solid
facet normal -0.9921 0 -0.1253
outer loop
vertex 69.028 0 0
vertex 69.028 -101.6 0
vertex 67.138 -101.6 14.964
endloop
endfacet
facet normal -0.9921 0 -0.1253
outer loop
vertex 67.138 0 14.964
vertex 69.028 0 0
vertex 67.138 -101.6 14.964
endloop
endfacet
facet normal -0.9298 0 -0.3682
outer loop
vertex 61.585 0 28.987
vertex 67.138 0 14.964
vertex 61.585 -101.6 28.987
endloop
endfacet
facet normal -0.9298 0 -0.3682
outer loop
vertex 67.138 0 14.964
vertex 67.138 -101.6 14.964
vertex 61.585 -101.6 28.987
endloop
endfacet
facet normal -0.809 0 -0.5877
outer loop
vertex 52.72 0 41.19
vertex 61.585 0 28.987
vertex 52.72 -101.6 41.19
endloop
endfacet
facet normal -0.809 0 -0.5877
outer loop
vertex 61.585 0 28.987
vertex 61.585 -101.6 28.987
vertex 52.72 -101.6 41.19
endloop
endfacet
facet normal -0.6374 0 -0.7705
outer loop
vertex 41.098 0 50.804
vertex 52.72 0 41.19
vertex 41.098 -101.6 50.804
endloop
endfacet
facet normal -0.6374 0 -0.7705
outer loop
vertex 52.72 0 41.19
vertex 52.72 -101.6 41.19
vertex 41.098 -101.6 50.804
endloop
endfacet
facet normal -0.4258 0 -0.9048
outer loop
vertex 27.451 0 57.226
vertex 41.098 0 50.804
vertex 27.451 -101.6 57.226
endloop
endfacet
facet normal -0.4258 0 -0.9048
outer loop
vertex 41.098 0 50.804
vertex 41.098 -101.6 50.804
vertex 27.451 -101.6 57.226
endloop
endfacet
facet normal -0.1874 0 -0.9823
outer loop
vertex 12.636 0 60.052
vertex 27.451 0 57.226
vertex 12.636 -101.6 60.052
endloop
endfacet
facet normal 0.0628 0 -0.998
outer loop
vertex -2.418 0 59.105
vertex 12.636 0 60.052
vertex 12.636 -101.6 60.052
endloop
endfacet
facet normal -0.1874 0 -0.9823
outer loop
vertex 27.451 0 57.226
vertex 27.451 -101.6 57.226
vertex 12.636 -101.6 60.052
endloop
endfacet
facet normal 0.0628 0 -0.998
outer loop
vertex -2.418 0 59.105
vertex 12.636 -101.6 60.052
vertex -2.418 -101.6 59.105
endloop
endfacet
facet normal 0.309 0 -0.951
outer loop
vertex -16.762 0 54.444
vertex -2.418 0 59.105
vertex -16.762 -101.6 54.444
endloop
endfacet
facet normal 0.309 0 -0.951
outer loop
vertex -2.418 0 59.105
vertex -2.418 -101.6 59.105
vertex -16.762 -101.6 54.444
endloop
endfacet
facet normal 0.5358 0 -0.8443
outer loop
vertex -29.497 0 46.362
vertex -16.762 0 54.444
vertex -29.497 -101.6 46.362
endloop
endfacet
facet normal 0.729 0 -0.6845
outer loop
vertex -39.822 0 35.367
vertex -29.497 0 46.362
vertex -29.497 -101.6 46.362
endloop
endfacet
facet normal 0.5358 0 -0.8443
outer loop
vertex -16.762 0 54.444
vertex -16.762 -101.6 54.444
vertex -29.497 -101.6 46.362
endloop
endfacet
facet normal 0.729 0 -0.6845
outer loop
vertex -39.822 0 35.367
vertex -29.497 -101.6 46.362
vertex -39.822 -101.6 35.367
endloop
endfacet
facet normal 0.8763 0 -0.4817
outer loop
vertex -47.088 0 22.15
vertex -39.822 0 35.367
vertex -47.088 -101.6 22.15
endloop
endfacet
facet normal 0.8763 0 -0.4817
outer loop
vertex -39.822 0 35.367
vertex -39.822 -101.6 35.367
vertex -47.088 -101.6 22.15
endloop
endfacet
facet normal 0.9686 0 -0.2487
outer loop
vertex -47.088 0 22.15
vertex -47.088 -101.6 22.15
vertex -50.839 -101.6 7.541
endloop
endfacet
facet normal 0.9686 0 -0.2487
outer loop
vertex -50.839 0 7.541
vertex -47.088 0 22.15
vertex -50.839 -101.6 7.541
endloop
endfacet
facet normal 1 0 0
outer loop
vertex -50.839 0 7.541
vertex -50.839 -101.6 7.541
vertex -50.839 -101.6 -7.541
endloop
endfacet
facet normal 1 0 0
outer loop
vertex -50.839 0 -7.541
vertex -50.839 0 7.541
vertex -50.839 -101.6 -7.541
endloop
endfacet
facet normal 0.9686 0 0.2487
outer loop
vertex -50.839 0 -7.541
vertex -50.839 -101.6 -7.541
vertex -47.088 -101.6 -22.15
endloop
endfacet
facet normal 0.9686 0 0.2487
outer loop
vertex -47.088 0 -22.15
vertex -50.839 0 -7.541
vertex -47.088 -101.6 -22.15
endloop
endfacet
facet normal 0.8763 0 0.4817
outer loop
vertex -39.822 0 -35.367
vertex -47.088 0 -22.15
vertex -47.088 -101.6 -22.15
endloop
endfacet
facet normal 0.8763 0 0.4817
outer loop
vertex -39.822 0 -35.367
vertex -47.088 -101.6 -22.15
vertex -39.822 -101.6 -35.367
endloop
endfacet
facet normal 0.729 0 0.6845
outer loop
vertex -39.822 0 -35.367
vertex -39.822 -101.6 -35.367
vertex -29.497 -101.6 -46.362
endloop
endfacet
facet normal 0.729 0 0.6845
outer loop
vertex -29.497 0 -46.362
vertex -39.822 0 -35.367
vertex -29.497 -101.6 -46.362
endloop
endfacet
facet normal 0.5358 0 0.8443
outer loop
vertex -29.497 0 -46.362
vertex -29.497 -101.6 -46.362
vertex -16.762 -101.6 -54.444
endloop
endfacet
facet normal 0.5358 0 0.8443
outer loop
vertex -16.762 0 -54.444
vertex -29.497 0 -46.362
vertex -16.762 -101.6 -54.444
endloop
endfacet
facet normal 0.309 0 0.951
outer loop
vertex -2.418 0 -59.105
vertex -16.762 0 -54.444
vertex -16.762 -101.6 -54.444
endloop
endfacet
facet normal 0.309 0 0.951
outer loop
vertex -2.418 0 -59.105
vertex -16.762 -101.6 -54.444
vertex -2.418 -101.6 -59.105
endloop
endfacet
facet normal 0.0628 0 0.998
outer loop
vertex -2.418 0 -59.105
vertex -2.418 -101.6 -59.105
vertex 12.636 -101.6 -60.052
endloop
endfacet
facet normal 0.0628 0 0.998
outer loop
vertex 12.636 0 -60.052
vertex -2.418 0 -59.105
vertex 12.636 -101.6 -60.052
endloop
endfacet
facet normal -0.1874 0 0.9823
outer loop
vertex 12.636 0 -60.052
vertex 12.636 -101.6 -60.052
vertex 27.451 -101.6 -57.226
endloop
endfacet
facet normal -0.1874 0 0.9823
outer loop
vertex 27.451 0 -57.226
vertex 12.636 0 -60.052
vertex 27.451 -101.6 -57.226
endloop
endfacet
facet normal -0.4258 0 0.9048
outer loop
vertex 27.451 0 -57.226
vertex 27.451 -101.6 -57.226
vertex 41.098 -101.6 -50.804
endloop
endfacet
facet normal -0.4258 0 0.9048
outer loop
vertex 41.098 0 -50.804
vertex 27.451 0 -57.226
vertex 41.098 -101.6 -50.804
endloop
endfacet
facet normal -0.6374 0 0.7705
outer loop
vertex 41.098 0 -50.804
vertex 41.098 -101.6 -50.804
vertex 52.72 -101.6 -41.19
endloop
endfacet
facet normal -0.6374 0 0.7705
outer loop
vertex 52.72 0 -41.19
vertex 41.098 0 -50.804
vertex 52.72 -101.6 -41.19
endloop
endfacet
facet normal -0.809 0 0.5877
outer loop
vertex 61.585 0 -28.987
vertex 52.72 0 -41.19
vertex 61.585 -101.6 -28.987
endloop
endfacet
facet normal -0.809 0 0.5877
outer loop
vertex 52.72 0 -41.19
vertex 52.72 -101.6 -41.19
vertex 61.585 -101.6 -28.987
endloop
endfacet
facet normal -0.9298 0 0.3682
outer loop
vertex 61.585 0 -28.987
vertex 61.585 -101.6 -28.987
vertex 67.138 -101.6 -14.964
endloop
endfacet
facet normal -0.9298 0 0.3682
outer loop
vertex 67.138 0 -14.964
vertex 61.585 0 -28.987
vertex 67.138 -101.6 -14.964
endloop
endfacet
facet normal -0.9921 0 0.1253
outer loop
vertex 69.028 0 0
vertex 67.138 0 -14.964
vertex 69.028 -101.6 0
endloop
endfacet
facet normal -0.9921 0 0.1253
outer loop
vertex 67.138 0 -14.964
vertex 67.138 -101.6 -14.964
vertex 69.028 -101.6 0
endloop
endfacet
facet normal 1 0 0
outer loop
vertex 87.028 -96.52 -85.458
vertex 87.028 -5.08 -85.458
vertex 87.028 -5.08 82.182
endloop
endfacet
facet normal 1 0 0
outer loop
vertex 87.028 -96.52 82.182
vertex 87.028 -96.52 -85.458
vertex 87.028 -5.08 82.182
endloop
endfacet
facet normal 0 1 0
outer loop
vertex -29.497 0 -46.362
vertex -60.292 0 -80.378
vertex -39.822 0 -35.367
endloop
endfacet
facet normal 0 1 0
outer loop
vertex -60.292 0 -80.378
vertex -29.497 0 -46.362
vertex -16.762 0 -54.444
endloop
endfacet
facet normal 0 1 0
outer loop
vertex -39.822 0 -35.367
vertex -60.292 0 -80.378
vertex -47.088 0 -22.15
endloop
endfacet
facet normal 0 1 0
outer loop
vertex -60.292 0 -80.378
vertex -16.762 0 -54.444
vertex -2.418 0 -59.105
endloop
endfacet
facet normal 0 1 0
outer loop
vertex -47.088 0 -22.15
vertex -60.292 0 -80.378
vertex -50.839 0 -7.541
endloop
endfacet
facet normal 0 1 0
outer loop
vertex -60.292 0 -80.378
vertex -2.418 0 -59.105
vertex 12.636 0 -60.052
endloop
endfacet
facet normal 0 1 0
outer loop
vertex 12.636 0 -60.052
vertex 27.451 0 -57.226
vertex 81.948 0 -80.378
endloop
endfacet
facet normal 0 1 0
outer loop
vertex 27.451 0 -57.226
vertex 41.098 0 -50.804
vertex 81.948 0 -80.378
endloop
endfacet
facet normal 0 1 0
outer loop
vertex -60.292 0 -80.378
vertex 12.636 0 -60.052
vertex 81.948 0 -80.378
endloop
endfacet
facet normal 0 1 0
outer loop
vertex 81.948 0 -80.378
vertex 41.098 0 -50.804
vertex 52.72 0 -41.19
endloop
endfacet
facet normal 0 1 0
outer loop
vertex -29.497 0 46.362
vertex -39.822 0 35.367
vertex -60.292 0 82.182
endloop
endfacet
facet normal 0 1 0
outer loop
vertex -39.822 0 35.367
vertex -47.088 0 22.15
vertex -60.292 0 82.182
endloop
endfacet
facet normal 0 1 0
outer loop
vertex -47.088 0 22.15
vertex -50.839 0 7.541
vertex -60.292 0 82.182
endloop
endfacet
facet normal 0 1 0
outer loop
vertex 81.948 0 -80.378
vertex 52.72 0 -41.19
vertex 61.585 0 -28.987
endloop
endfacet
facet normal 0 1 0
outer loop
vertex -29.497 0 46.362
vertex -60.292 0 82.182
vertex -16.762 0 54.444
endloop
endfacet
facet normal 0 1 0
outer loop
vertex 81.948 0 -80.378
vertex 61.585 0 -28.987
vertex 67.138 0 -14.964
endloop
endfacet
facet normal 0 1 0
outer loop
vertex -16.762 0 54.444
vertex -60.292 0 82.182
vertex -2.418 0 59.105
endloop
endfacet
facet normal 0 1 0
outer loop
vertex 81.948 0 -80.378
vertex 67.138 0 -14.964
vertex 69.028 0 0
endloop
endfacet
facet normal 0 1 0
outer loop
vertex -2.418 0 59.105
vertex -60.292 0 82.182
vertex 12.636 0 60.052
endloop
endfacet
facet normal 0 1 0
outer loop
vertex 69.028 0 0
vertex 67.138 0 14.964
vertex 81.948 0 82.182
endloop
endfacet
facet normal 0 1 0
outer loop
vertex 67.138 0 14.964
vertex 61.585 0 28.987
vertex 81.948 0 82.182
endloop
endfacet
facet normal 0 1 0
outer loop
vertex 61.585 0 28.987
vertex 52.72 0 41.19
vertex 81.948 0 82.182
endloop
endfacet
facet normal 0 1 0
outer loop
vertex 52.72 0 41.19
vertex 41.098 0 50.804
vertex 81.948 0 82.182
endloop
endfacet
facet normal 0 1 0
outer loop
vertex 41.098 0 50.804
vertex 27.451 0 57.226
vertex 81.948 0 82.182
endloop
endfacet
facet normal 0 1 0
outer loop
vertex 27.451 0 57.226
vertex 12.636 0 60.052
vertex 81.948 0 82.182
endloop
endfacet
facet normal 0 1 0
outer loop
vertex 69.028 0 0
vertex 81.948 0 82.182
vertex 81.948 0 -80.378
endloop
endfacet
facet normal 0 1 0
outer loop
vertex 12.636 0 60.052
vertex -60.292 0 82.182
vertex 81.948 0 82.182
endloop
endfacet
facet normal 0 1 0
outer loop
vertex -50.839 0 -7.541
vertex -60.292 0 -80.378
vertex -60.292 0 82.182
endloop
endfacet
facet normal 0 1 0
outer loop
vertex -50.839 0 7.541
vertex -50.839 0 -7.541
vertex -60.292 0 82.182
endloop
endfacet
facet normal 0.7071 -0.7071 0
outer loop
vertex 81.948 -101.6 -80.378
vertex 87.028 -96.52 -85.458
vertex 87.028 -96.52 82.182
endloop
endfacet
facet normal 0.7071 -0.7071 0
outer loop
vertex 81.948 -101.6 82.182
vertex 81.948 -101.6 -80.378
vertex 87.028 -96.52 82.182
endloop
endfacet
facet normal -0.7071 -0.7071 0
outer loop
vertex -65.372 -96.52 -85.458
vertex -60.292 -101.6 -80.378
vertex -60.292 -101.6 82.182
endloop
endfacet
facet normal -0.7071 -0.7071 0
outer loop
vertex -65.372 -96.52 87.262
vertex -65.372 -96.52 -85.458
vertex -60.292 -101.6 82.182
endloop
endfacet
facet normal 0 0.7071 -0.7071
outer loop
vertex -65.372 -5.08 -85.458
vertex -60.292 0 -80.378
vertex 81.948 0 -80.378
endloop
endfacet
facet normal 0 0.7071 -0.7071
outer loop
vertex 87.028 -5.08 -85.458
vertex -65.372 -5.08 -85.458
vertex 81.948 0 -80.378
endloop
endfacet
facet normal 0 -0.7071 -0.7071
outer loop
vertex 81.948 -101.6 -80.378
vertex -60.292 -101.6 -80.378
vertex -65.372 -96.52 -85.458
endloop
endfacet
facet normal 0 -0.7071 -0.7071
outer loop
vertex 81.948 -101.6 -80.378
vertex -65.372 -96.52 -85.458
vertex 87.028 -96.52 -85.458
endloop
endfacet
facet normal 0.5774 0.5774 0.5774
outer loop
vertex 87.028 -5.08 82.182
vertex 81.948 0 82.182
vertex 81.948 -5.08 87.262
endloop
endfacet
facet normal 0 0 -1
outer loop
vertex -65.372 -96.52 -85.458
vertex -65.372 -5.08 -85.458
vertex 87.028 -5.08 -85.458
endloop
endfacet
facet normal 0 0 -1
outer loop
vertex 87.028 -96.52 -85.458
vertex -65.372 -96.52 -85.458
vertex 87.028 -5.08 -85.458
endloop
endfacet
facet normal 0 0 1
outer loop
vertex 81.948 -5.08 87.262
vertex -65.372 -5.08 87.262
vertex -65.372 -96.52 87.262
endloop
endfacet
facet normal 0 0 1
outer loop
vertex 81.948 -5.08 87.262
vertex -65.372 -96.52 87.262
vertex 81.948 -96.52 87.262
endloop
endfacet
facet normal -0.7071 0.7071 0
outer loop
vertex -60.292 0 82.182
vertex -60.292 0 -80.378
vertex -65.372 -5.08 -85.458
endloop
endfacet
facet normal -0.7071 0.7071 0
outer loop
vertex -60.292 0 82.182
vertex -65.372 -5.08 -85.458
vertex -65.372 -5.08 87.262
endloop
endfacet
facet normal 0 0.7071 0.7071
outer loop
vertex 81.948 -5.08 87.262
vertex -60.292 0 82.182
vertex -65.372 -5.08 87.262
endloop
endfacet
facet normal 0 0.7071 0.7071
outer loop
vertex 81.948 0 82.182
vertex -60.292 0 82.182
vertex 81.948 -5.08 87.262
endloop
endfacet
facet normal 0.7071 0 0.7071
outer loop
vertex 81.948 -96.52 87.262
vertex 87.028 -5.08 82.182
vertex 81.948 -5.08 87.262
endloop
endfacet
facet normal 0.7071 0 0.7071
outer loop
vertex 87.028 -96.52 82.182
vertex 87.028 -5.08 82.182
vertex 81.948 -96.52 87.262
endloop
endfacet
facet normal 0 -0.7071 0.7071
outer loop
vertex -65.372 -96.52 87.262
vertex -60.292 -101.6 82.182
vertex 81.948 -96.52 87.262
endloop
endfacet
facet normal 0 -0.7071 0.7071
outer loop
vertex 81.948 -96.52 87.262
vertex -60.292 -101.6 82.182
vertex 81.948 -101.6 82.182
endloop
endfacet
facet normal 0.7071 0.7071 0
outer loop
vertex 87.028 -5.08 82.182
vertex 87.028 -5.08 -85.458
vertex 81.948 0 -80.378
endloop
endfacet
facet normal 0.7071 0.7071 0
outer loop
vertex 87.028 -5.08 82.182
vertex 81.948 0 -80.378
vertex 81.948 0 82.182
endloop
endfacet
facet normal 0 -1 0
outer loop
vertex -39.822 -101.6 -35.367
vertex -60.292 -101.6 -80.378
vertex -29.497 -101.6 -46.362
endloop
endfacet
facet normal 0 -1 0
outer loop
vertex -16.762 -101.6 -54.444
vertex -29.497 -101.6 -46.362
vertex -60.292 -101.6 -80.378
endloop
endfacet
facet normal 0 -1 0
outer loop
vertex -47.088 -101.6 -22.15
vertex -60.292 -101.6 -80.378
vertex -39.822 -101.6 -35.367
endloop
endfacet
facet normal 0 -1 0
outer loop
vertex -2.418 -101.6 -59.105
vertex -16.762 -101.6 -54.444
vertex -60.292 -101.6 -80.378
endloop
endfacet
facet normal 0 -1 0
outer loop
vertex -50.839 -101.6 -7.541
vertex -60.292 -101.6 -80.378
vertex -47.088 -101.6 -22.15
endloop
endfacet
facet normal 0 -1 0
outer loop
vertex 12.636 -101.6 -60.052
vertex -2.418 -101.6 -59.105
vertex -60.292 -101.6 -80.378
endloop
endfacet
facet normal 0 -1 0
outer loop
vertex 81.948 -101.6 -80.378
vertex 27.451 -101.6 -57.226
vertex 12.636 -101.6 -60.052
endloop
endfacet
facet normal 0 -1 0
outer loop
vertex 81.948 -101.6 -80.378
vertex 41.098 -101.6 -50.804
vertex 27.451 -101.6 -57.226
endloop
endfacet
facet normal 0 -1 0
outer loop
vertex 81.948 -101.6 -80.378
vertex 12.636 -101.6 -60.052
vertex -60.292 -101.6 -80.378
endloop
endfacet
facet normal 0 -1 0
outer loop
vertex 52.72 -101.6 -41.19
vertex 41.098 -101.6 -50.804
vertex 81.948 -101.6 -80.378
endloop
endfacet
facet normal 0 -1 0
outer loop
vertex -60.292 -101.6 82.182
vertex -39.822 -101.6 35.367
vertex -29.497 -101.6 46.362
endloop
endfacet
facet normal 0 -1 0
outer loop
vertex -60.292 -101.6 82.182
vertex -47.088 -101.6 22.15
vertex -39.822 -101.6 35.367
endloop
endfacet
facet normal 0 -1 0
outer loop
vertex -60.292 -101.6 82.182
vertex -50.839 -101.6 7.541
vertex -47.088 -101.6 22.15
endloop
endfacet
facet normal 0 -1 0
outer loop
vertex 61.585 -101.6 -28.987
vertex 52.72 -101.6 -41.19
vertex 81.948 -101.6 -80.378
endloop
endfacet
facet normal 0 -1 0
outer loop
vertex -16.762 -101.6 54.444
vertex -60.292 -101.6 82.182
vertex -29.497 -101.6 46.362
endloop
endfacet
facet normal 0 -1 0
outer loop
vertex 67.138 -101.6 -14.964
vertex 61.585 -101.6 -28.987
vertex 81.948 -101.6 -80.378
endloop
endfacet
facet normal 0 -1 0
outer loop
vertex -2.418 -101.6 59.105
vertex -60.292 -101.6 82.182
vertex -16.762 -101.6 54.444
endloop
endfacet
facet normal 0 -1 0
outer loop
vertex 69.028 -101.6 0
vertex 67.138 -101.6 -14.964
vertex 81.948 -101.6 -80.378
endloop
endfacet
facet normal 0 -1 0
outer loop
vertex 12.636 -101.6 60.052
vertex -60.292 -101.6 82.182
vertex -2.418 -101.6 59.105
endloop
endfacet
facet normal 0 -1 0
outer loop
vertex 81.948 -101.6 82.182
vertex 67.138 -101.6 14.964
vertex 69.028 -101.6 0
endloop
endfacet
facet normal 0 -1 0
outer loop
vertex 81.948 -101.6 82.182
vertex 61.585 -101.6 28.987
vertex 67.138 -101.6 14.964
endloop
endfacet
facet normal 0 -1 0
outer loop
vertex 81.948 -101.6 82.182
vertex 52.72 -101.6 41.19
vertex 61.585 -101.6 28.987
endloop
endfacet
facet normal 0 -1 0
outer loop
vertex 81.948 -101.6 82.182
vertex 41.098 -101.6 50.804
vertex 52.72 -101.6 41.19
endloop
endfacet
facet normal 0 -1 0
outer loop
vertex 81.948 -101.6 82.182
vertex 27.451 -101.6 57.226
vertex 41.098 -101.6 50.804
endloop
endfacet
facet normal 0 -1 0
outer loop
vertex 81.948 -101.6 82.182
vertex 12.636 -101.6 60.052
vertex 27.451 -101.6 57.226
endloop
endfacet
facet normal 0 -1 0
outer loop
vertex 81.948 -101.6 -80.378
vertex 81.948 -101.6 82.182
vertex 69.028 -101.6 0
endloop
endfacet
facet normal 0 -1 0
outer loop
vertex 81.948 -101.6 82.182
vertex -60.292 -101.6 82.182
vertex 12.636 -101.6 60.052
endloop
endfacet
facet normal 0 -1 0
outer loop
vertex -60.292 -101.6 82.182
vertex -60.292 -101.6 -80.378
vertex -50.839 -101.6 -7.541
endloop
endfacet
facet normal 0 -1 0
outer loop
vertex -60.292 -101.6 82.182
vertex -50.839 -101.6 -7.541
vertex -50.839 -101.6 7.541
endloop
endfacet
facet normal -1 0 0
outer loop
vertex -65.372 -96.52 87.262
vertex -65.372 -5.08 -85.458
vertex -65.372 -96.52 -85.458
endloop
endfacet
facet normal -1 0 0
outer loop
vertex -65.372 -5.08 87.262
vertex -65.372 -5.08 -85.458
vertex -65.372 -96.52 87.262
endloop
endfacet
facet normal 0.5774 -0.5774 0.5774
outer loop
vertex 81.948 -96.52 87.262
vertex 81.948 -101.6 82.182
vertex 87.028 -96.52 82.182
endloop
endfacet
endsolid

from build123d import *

# Parameters (mm, degrees)
F0_W     = 152.4
F0_H     = 172.720005
F1_DEPTH = 101.6
F2_R     = 60.170779
F3_DEPTH = 101.601
F4_SIZE  = 5.08


with BuildPart() as f1:
    # F0 (on Front) → F1 (new body)
    with BuildSketch(Plane.XZ):
        with Locations((10.828421, 0.902369)):
            Rectangle(F0_W, F0_H)
    extrude(amount=F1_DEPTH)

    # F2 (on face) → F3 (cut, through all)
    with BuildSketch(Plane.XZ.offset(101.6)):
        with Locations((8.857357, 0)):
            Circle(F2_R)
    extrude(amount=-F3_DEPTH, mode=Mode.SUBTRACT)

    # F4
    f4_edges = [f1.edges().sort_by_distance(p)[0] for p in [
        (87.028421, -101.6, 0.90237),
        (10.828421, -101.6, 87.262372),
        (10.828421, -101.6, -85.457633),
        (-65.371579, -101.6, 0.90237),
        (10.828421, 0, -85.457633),
        (-65.371579, 0, 0.90237),
        (87.028421, 0, 0.90237),
        (10.828421, 0, 87.262372),
        (87.028421, -50.8, 87.262372),
    ]]
    chamfer(f4_edges, length=F4_SIZE)


solid = f1.part
